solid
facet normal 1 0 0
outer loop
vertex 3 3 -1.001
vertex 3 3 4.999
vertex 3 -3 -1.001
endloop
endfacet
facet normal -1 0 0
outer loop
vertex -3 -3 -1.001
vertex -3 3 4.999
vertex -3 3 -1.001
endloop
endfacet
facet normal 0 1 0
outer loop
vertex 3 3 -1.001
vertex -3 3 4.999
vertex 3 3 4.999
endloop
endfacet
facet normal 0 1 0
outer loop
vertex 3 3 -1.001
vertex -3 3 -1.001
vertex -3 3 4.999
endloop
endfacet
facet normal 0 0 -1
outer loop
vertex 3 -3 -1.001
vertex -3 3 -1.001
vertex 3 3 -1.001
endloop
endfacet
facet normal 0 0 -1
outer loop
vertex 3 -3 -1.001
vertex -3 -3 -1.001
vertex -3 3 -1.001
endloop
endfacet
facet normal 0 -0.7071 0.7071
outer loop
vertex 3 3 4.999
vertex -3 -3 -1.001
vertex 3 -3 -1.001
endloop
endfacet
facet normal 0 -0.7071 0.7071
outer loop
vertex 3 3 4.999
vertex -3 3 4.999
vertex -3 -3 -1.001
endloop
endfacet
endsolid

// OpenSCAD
// file: ../lib/doblo-params.scad
/*
 Copyright (c) 2013 Daniel M. Taub
 Copyright (c) 2010 Daniel K. Schneider

 This file is part of DobloFactory.

 DobloFactory is free source: you can redistribute it and/or modify
    modify it under the terms of the CC BY-NC-SA 3.0 License:
    CreativeCommons Attribution-NonCommerical-ShareAlike 3.0
    as published by Creative Commons.

    You should have received a copy of the CC BY-NC-SA 3.0 License
    with this source package.
    If not, see <http://creativecommons.org/licenses/by-nc-sa/3.0/>

-------------------------
PARAMETERS              -
-------------------------

These define in principle all dimensions.

Close to DUPLO dimensions by default. Depending on your printer and your layer/thickness printing parameters you do want to change nibbles and walls. The settings below are for a layer Thickness of 0.25mm

All units are mm.

Dimensions:
* A typical small 2x2 nibbles on top DUPLO compatible brick with one nibble underneath is
32mm x 32mm x 19.2mm (plus a nibble height of 4.5mm)
* LEGO-compatible bricks are half that size in all three dimensions

*/

// Normal size (DUPLO)
// SCALE = 1;
// Lego size - see also the hacks in the code for fixing wall and nibble dimensions
// SCALE = 0.5 ;
// Mini Lego size / Nano - does not really work yet, but you can try
// SCALE = 0.25

// DATA FOR QUATRO (DMT)
// nibble outter diam: 18.45
// nibble inner diam: 14.45
// nibble inner nub(for duplo) diam: 13.25

CADRO = 2; // not yet tested
DOBLO = 1;
LUGO = 0.5;
MINI = 0.25; // not tested much

HALF=3;
THIRD=2;
THIRDx2=4;
FULL=6;

// defines minimum size of a fragment of a nibble, e.g. set openscad $fs
// Smaller is better, but will take much more time for rendering and slicing
NIBBLE_FS = 0.5;
CYL_FS = 2;

// LEGO SCALE - don't change, allows to create nano legos, should be 1 if real Legos
function LEGO_SCALE(SCALE) = 2 * SCALE;

// Doblo block size
// Real DUPLO Block = 31.7 / 2 = 15.85 (with some variations)
function PART_WIDTH(SCALE)  = 16.0  * SCALE;

// Block height (a typical block is 4 * PART_HEIGHT)
// Real Duplo Block = 19.17 / 4 = 4.8, we also measured 19.09, 19.16
function PART_HEIGHT(SCALE)  = (SCALE < 0.6) ? ( 1.6 * LEGO_SCALE(SCALE) ) : ( 3.2 * SCALE );
// Diamonds - size of anti-warping holes - used optionally
DIAMOND = 4;

// Top nibble size definitions
// Must be adjusted with respect to layer resolution and other slicing considerations
function NO(SCALE)         = PART_WIDTH(SCALE) / 2.0;              //nibble offset
function NBO(SCALE)        = PART_WIDTH(SCALE);                   // nibble bottom offset
function NH(SCALE)         = (SCALE < 0.6) ? 1.75 * LEGO_SCALE(SCALE) : 4.55 * SCALE;  // LEGO vs. DUPLO
function NB_RADIUS(SCALE)  = (SCALE < 0.6) ? (4.9 / 2 * LEGO_SCALE(SCALE)) : (9.2 / 2.0 * SCALE);  // Lego vs. DUPLO

// Real DUPLO Block = 9.38
function NB_RADIUS_INSIDE(SCALE) = 6.8/2  * SCALE;
// 6.44 = Real DUPLO block

function NB_THICKNESS(SCALE)=NB_RADIUS(SCALE)-NB_RADIUS_INSIDE(SCALE);

// For square nibble supports in 1xM or Nx1 blocks
function ALONG_LEN(SCALE)  = (PART_WIDTH(SCALE)-NB_RADIUS(SCALE))/1.7; //tighter fit than 1.8
function CROSS_LEN(SCALE)  = (PART_WIDTH(SCALE)-NB_RADIUS(SCALE)/2);

// Bottom nibbles size definitions
// Must be adjusted with respect to layer resolution and other slicing considerations
function NB_BOTTOM_RADIUS(SCALE)        = (SCALE < 0.6) ? 6.5/2*LEGO_SCALE(SCALE) : 13.4/2*SCALE;
function NB_BOTTOM_RADIUS_THIN(SCALE)   = (SCALE < 0.6) ? 3.5/2*LEGO_SCALE(SCALE) : 7.2/2*SCALE;
// Real DUPLO = 13.48
function NB_BOTTOM_RADIUS_INSIDE(SCALE) = (SCALE < 0.6) ? 4.8/2*LEGO_SCALE(SCALE) : 10.8/2*SCALE;
// Real DUPLO = 10.73
// rapman 10.6
// Real Lego = 4.9

// walls - IMPORTANT: must be adjusted with respect to layer resolution and other slicing considerations
function DOBLOWALL(SCALE) = (SCALE < 0.6) ? 1.2 * LEGO_SCALE(SCALE): 1.55 *SCALE;
// Lego vs. Duplo, Lego is not 2x smaller
// Real Lego = 1.2

function USE_INSET(SCALE) = (SCALE < 0.6) ? true : true;
function INSET_WIDTH(SCALE)    = (SCALE < 0.6) ? 0.4 *LEGO_SCALE(SCALE) : 1.50 * SCALE; //little inset walls to make it stick
function INSET_LENGTH(SCALE)  = (SCALE < 0.6) ? 3*DOBLOWALL(SCALE) : 4*DOBLOWALL(SCALE); // Legos have proportionally smaller insets

//lattice width and height (optional, see LATTICE_TYPE)
// A grid underneath the flat bridge, crossing through the nibbles underneath
function LATTICE_WIDTH(SCALE)   = 1.50 * SCALE;

// 0 means none, 1 means more spacing (same as nibbles underneath),
// 2 means denser
LATTICE_TYPE    = 1;

// Sizes of a standard 2x2 square brick, normal height
// Not used, but are practical in your custom modules
function DOBLOWIDTH(SCALE)  = PART_WIDTH(SCALE)  * 2.0  * SCALE;
function DOBLOHEIGHT(SCALE) = PART_HEIGHT(SCALE) * 6.0  * SCALE;
function LEGOHEIGHT(SCALE)  = PART_HEIGHT(SCALE) * 6.0  * SCALE;
// main file
include <../doblo-factory.scad>;
include <../lib/doblo-params.scad>;

tri_prism (FULL,FULL,FULL);
